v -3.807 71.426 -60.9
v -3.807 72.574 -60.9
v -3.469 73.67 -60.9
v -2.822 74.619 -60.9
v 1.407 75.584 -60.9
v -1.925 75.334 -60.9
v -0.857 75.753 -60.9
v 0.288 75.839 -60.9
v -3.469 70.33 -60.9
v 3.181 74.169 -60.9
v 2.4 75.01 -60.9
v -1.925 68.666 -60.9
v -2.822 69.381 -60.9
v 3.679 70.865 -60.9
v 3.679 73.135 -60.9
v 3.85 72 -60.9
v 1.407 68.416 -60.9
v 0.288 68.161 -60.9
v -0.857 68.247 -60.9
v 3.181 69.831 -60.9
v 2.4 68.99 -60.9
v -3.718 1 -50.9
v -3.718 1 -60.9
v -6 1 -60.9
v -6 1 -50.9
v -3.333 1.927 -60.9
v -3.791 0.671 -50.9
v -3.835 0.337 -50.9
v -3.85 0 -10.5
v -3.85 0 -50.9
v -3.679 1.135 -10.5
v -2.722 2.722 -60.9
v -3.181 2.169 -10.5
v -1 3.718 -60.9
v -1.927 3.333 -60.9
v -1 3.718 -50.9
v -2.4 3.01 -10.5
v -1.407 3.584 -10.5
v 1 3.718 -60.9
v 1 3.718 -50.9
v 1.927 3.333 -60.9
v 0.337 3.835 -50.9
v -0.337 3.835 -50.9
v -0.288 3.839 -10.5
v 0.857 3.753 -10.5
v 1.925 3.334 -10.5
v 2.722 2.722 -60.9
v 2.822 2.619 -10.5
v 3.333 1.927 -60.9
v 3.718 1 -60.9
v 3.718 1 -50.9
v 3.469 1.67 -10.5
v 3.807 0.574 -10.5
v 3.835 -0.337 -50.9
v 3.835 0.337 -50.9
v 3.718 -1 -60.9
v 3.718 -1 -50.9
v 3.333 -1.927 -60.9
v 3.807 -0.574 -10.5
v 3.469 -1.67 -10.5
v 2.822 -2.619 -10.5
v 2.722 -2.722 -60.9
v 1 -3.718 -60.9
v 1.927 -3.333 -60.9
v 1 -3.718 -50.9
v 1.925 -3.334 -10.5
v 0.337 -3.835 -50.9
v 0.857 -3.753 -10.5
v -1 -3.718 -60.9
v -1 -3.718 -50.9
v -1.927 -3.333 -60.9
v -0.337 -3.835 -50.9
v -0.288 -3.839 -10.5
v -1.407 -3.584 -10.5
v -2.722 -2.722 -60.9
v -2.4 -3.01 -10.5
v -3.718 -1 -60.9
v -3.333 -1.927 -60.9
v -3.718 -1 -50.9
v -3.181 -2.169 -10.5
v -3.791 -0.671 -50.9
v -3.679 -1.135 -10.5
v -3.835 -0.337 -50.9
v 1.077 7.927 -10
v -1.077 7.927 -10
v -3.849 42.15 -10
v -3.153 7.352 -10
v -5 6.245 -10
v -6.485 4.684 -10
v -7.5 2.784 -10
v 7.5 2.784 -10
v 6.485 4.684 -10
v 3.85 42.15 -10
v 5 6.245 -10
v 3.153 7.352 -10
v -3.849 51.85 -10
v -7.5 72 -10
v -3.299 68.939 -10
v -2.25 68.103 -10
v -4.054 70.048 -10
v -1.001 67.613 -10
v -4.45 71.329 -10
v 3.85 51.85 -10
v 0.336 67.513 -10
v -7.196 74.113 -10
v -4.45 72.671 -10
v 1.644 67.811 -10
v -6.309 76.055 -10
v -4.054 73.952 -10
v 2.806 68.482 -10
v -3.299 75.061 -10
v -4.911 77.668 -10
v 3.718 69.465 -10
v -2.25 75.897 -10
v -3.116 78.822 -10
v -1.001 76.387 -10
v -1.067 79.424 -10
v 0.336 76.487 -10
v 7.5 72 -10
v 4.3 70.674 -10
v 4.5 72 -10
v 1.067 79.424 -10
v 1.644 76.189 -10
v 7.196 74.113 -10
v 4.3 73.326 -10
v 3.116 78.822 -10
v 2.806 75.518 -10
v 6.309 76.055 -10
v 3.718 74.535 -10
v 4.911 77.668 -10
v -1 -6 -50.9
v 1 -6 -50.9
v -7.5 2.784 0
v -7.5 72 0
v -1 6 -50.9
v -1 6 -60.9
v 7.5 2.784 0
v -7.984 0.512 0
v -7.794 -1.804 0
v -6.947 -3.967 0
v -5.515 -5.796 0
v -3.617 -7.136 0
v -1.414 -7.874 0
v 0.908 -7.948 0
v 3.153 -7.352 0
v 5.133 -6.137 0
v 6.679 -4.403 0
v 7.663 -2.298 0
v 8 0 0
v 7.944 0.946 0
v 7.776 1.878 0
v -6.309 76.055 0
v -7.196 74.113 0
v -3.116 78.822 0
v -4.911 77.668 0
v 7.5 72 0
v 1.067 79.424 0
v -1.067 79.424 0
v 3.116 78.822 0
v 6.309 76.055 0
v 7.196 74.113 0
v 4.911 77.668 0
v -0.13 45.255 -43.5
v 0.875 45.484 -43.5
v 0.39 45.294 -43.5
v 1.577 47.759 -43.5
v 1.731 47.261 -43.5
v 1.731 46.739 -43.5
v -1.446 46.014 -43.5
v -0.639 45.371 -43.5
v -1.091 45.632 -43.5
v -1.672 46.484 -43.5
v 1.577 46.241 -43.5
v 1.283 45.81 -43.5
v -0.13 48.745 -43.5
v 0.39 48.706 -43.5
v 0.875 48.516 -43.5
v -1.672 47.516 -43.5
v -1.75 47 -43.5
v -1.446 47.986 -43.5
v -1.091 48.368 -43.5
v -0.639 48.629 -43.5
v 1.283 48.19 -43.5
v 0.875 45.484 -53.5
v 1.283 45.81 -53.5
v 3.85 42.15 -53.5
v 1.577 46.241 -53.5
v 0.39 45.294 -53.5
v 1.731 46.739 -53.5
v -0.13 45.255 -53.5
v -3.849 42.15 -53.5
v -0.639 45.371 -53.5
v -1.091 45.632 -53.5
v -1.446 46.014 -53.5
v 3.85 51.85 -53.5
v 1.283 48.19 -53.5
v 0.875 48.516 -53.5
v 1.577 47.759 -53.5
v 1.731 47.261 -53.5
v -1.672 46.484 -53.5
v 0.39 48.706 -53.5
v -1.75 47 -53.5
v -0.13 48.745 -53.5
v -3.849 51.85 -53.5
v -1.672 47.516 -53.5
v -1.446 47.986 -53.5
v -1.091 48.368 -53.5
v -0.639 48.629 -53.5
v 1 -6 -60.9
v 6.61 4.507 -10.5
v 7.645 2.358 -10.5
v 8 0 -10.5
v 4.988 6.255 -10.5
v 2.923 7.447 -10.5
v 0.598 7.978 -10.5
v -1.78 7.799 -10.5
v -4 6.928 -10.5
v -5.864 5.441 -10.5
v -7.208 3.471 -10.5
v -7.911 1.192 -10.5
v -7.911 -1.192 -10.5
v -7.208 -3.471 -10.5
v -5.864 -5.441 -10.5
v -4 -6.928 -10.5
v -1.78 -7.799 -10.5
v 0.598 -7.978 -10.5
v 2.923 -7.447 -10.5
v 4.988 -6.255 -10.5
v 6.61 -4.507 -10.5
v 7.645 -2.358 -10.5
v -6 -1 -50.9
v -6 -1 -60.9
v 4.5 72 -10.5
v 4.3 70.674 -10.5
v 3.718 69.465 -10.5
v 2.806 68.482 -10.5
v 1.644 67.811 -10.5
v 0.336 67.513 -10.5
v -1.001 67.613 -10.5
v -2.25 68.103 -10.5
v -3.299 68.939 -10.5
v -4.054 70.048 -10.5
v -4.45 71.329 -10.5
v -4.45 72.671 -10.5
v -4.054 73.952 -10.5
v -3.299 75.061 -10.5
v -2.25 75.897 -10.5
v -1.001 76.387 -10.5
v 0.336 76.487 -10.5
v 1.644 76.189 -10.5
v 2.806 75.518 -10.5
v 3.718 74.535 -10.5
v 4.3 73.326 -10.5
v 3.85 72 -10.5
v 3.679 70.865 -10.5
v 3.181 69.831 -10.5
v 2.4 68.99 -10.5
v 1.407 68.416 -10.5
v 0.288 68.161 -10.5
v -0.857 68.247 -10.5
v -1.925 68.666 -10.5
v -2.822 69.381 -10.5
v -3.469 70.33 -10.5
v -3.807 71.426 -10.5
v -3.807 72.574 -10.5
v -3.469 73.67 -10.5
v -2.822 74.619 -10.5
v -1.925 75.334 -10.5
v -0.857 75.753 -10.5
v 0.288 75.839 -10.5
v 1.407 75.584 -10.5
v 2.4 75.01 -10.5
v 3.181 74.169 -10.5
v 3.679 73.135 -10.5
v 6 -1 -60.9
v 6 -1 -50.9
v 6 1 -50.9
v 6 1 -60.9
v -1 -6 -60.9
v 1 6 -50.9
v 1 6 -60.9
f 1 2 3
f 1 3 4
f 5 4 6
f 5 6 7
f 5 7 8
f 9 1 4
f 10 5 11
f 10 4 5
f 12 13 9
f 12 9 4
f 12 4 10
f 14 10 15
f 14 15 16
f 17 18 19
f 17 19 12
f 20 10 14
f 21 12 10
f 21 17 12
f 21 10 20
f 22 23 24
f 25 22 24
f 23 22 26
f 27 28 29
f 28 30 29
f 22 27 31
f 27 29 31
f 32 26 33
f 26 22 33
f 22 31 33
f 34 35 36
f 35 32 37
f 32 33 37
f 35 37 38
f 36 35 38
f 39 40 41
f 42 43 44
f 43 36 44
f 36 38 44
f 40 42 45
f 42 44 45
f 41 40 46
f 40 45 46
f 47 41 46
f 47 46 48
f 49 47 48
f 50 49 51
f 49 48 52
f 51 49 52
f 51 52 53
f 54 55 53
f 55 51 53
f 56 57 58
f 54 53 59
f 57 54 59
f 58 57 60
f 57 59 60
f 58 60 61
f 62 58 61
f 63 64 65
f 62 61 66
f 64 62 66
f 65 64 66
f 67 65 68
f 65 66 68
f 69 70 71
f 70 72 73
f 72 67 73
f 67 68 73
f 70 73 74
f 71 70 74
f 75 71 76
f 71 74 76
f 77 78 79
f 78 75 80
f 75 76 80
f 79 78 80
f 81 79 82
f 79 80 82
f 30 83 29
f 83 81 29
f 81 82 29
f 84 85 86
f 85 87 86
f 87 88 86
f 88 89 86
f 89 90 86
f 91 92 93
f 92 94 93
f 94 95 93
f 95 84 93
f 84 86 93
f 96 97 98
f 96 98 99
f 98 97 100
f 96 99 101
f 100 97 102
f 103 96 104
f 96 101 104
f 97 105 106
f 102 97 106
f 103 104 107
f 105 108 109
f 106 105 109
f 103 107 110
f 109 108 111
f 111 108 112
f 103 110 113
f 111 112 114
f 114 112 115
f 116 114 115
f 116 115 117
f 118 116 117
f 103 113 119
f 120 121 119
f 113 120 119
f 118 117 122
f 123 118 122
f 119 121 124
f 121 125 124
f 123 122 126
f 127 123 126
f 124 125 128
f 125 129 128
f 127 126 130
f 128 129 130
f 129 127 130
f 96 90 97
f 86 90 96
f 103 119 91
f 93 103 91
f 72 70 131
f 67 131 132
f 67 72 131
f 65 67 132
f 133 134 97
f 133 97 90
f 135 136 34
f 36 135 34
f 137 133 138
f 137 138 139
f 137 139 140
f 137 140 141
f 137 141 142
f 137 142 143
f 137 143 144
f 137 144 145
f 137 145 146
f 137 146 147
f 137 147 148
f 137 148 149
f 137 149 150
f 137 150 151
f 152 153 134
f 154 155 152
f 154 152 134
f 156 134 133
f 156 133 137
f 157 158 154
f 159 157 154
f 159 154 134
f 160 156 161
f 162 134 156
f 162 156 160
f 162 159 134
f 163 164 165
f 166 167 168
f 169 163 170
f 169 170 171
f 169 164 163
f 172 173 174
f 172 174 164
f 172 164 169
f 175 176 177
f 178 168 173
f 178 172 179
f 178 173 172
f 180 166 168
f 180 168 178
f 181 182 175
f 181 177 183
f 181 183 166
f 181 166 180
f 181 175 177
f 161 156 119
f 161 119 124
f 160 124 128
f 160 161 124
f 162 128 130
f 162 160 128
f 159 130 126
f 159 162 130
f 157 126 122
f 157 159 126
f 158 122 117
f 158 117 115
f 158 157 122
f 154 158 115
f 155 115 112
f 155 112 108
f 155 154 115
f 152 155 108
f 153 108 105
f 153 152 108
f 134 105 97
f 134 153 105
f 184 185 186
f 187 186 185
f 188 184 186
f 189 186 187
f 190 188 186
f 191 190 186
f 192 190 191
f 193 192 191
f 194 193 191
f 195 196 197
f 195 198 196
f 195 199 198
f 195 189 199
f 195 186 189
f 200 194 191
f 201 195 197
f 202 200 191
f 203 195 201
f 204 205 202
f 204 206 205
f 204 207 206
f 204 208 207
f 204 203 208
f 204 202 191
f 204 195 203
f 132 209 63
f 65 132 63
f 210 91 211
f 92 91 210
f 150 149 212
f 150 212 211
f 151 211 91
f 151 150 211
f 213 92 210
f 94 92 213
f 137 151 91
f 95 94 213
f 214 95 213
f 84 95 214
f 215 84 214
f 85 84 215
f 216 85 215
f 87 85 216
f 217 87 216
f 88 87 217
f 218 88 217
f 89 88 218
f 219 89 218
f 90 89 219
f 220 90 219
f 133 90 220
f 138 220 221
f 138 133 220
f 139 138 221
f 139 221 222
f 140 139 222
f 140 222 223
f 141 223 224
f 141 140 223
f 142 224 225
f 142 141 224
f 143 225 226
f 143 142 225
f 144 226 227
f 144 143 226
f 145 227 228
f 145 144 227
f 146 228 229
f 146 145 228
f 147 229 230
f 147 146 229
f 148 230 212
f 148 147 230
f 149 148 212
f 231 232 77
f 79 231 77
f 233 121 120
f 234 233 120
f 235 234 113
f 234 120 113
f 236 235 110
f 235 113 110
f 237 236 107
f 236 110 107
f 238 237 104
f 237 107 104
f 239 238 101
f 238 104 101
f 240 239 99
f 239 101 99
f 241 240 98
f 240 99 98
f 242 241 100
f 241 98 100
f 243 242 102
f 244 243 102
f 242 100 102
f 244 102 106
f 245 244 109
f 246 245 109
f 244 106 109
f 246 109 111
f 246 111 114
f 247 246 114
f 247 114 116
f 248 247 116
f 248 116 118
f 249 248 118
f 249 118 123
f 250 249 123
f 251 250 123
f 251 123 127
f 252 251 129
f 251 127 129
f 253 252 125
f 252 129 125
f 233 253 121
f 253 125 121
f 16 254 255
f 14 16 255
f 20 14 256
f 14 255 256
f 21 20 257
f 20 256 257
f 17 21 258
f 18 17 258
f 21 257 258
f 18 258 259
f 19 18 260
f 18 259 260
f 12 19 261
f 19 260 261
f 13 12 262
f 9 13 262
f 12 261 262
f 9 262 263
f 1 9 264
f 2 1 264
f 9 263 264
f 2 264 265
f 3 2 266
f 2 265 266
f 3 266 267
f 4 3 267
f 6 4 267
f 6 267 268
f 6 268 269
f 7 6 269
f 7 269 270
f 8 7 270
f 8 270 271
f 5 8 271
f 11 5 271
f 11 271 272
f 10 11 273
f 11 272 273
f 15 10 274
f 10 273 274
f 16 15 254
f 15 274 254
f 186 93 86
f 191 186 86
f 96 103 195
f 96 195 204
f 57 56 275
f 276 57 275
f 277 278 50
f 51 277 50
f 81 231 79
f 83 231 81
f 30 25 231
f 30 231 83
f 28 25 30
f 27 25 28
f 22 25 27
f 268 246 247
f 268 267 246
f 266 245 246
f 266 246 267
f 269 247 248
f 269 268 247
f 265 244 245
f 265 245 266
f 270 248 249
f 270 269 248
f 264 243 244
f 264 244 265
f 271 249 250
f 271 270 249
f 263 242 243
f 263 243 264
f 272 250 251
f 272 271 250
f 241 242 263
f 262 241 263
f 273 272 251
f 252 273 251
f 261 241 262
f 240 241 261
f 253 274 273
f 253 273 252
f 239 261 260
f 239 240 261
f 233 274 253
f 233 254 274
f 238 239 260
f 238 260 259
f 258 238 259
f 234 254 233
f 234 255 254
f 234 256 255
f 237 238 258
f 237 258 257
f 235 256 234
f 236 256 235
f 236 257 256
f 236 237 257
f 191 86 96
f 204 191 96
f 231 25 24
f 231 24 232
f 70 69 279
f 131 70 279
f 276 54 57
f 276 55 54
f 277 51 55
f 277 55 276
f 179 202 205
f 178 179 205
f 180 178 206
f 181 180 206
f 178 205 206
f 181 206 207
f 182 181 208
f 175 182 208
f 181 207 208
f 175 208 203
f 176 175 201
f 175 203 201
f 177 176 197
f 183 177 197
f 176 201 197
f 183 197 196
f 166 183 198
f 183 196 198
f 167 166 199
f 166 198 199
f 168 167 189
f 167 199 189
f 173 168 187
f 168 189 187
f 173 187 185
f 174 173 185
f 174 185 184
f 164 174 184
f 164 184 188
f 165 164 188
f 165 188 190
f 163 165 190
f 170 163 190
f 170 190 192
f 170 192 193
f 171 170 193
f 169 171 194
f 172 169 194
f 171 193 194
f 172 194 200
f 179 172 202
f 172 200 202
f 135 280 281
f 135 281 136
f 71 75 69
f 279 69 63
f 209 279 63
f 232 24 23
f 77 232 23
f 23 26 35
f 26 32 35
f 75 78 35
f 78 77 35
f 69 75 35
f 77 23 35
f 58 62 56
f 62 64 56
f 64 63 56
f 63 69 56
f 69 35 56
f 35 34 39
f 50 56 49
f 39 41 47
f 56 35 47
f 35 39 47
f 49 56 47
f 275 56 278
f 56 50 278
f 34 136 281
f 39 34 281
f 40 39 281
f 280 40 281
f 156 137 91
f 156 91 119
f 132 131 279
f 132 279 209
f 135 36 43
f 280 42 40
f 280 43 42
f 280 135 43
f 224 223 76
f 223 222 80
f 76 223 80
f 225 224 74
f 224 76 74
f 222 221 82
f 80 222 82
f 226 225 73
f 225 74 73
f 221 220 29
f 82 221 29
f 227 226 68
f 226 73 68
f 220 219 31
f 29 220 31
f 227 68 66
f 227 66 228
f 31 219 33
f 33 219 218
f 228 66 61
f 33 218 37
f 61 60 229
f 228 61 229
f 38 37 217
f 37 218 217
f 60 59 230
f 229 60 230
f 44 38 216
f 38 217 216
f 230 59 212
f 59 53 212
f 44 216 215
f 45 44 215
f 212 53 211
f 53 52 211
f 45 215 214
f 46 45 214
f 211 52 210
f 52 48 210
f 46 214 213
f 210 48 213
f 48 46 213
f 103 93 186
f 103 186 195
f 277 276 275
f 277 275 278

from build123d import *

# Parameters (mm, degrees)
SKETCH1_R           = 8
BOSS_EXTRUDE1_DEPTH = 10.5
SKETCH2_R           = 3.85
BOSS_EXTRUDE2_DEPTH = 60
BOSS_EXTRUDE3_START = -9.6
BOSS_EXTRUDE3_DEPTH = 10
CUT_EXTRUDE1_START  = -9.6
SKETCH6_R           = 3.85
CUT_EXTRUDE1_DEPTH  = 9.6
BOSS_EXTRUDE4_DEPTH = 10
SKETCH8_R           = 4.5
BOSS_EXTRUDE5_DEPTH = 0.5
SKETCH9_R           = 3.85
BOSS_EXTRUDE6_DEPTH = 50.4
SKETCH11_W          = 7.6994
SKETCH11_H          = 9.7
BOSS_EXTRUDE7_DEPTH = 43.5
SKETCH12_R          = 1.75
CUT_EXTRUDE2_DEPTH  = 10


with BuildPart() as part:
    # Sketch1 → Boss-Extrude1 (new body)
    with BuildSketch(Plane.XY):
        Circle(SKETCH1_R)
    extrude(amount=-BOSS_EXTRUDE1_DEPTH)

    # Sketch2 → Boss-Extrude2 (add)
    with BuildSketch(Plane(origin=(0, 0, -10.5), x_dir=(-1, 0, 0), z_dir=(0, 0, -1))):
        Circle(SKETCH2_R)
    extrude(amount=BOSS_EXTRUDE2_DEPTH)

    # Sketch3 → Boss-Extrude3 (add)
    with BuildSketch(Plane(origin=(0, 0, -70.5), x_dir=(-1, 0, 0), z_dir=(0, 0, -1)).offset(BOSS_EXTRUDE3_START)):
        Polygon((-6, 1), (-1, 1), (-1, 6), (1, 6), (1, 1), (6, 1), (6, -1), (1, -1), (1, -6), (-1, -6), (-1, -1), (-6, -1), align=None)
    extrude(amount=-BOSS_EXTRUDE3_DEPTH)

    # Sketch6 → Cut-Extrude1 (cut)
    with BuildSketch(Plane(origin=(0, 0, -70.5), x_dir=(-1, 0, 0), z_dir=(0, 0, -1)).offset(CUT_EXTRUDE1_START)):
        with Locations(Location((0, 0, 0), (0, 0, 195.05465064))):
            Circle(SKETCH6_R)
    extrude(amount=CUT_EXTRUDE1_DEPTH, mode=Mode.SUBTRACT)

    # Sketch7 → Boss-Extrude4 (add)
    with BuildSketch(Plane.XY):
        with BuildLine():
            Line((-7.5, 72), (-7.5, 2.783882181))
            Line((-7.5, 2.783882181), (7.5, 2.783882181))
            Line((7.5, 2.783882181), (7.5, 72))
            ThreePointArc((7.5, 72), (0, 79.5), (-7.5, 72))
        make_face()
    extrude(amount=-BOSS_EXTRUDE4_DEPTH)

    # Sketch8 → Boss-Extrude5 (add)
    with BuildSketch(Plane(origin=(0, 0, -10), x_dir=(-1, 0, 0), z_dir=(0, 0, -1))):
        with Locations(Location((0, 72, 0), (0, 0, 180))):
            Circle(SKETCH8_R)
    extrude(amount=BOSS_EXTRUDE5_DEPTH)

    # Sketch9 → Boss-Extrude6 (add)
    with BuildSketch(Plane(origin=(0, 0, -10.5), x_dir=(-1, 0, 0), z_dir=(0, 0, -1))):
        with Locations(Location((0, 72, 0), (0, 0, 180))):
            Circle(SKETCH9_R)
    extrude(amount=BOSS_EXTRUDE6_DEPTH)

    # Sketch11 → Boss-Extrude7 (add)
    with BuildSketch(Plane(origin=(0, 0, -10), x_dir=(-1, 0, 0), z_dir=(0, 0, -1))):
        with Locations((-0.0003, 47)):
            Rectangle(SKETCH11_W, SKETCH11_H)
    extrude(amount=BOSS_EXTRUDE7_DEPTH)

    # Sketch12 → Cut-Extrude2 (cut)
    with BuildSketch(Plane(origin=(0, 0, -53.5), x_dir=(-1, 0, 0), z_dir=(0, 0, -1))):
        with Locations((-0.0003, 47)):
            Circle(SKETCH12_R)
    extrude(amount=-CUT_EXTRUDE2_DEPTH, mode=Mode.SUBTRACT)


solid = part.part
